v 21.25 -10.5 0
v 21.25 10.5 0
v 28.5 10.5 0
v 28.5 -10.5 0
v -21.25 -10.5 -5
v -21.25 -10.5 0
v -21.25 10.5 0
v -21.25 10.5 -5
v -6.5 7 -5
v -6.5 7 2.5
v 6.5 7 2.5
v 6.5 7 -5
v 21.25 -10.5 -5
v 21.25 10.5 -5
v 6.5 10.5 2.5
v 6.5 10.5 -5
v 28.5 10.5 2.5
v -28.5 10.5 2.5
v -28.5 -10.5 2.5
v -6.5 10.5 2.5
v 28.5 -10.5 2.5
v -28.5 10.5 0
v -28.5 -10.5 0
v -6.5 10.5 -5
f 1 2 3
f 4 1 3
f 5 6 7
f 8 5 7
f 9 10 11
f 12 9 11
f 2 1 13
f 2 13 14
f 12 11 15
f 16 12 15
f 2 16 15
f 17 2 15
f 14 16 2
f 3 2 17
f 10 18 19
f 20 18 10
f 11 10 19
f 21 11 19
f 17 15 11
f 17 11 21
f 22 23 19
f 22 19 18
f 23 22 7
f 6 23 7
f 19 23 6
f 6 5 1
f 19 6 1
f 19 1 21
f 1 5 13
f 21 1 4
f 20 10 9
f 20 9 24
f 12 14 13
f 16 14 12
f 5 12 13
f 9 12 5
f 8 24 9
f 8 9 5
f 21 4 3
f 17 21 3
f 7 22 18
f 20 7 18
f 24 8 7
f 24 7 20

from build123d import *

# Parameters (mm, degrees)
SKETCH1_W           = 57
SKETCH1_H           = 21
BOSS_EXTRUDE1_DEPTH = 2.5
SKETCH2_W           = 42.5
SKETCH2_H           = 21
BOSS_EXTRUDE2_DEPTH = 5
SKETCH3_W           = 13
SKETCH3_H           = 3.5
CUT_EXTRUDE1_DEPTH  = 8.5


with BuildPart() as part:
    # Sketch1 → Boss-Extrude1 (new body)
    with BuildSketch(Plane.XY):
        Rectangle(SKETCH1_W, SKETCH1_H)
    extrude(amount=BOSS_EXTRUDE1_DEPTH)

    # Sketch2 → Boss-Extrude2 (add)
    with BuildSketch(Plane(origin=(0, 0, 0), x_dir=(-1, 0, 0), z_dir=(0, 0, -1))):
        Rectangle(SKETCH2_W, SKETCH2_H)
    extrude(amount=BOSS_EXTRUDE2_DEPTH)

    # Sketch3 → Cut-Extrude1 (cut, through all)
    with BuildSketch(Plane.XY.offset(2.5)):
        with Locations((0, 8.75)):
            Rectangle(SKETCH3_W, SKETCH3_H)
    extrude(amount=-CUT_EXTRUDE1_DEPTH, mode=Mode.SUBTRACT)


solid = part.part
